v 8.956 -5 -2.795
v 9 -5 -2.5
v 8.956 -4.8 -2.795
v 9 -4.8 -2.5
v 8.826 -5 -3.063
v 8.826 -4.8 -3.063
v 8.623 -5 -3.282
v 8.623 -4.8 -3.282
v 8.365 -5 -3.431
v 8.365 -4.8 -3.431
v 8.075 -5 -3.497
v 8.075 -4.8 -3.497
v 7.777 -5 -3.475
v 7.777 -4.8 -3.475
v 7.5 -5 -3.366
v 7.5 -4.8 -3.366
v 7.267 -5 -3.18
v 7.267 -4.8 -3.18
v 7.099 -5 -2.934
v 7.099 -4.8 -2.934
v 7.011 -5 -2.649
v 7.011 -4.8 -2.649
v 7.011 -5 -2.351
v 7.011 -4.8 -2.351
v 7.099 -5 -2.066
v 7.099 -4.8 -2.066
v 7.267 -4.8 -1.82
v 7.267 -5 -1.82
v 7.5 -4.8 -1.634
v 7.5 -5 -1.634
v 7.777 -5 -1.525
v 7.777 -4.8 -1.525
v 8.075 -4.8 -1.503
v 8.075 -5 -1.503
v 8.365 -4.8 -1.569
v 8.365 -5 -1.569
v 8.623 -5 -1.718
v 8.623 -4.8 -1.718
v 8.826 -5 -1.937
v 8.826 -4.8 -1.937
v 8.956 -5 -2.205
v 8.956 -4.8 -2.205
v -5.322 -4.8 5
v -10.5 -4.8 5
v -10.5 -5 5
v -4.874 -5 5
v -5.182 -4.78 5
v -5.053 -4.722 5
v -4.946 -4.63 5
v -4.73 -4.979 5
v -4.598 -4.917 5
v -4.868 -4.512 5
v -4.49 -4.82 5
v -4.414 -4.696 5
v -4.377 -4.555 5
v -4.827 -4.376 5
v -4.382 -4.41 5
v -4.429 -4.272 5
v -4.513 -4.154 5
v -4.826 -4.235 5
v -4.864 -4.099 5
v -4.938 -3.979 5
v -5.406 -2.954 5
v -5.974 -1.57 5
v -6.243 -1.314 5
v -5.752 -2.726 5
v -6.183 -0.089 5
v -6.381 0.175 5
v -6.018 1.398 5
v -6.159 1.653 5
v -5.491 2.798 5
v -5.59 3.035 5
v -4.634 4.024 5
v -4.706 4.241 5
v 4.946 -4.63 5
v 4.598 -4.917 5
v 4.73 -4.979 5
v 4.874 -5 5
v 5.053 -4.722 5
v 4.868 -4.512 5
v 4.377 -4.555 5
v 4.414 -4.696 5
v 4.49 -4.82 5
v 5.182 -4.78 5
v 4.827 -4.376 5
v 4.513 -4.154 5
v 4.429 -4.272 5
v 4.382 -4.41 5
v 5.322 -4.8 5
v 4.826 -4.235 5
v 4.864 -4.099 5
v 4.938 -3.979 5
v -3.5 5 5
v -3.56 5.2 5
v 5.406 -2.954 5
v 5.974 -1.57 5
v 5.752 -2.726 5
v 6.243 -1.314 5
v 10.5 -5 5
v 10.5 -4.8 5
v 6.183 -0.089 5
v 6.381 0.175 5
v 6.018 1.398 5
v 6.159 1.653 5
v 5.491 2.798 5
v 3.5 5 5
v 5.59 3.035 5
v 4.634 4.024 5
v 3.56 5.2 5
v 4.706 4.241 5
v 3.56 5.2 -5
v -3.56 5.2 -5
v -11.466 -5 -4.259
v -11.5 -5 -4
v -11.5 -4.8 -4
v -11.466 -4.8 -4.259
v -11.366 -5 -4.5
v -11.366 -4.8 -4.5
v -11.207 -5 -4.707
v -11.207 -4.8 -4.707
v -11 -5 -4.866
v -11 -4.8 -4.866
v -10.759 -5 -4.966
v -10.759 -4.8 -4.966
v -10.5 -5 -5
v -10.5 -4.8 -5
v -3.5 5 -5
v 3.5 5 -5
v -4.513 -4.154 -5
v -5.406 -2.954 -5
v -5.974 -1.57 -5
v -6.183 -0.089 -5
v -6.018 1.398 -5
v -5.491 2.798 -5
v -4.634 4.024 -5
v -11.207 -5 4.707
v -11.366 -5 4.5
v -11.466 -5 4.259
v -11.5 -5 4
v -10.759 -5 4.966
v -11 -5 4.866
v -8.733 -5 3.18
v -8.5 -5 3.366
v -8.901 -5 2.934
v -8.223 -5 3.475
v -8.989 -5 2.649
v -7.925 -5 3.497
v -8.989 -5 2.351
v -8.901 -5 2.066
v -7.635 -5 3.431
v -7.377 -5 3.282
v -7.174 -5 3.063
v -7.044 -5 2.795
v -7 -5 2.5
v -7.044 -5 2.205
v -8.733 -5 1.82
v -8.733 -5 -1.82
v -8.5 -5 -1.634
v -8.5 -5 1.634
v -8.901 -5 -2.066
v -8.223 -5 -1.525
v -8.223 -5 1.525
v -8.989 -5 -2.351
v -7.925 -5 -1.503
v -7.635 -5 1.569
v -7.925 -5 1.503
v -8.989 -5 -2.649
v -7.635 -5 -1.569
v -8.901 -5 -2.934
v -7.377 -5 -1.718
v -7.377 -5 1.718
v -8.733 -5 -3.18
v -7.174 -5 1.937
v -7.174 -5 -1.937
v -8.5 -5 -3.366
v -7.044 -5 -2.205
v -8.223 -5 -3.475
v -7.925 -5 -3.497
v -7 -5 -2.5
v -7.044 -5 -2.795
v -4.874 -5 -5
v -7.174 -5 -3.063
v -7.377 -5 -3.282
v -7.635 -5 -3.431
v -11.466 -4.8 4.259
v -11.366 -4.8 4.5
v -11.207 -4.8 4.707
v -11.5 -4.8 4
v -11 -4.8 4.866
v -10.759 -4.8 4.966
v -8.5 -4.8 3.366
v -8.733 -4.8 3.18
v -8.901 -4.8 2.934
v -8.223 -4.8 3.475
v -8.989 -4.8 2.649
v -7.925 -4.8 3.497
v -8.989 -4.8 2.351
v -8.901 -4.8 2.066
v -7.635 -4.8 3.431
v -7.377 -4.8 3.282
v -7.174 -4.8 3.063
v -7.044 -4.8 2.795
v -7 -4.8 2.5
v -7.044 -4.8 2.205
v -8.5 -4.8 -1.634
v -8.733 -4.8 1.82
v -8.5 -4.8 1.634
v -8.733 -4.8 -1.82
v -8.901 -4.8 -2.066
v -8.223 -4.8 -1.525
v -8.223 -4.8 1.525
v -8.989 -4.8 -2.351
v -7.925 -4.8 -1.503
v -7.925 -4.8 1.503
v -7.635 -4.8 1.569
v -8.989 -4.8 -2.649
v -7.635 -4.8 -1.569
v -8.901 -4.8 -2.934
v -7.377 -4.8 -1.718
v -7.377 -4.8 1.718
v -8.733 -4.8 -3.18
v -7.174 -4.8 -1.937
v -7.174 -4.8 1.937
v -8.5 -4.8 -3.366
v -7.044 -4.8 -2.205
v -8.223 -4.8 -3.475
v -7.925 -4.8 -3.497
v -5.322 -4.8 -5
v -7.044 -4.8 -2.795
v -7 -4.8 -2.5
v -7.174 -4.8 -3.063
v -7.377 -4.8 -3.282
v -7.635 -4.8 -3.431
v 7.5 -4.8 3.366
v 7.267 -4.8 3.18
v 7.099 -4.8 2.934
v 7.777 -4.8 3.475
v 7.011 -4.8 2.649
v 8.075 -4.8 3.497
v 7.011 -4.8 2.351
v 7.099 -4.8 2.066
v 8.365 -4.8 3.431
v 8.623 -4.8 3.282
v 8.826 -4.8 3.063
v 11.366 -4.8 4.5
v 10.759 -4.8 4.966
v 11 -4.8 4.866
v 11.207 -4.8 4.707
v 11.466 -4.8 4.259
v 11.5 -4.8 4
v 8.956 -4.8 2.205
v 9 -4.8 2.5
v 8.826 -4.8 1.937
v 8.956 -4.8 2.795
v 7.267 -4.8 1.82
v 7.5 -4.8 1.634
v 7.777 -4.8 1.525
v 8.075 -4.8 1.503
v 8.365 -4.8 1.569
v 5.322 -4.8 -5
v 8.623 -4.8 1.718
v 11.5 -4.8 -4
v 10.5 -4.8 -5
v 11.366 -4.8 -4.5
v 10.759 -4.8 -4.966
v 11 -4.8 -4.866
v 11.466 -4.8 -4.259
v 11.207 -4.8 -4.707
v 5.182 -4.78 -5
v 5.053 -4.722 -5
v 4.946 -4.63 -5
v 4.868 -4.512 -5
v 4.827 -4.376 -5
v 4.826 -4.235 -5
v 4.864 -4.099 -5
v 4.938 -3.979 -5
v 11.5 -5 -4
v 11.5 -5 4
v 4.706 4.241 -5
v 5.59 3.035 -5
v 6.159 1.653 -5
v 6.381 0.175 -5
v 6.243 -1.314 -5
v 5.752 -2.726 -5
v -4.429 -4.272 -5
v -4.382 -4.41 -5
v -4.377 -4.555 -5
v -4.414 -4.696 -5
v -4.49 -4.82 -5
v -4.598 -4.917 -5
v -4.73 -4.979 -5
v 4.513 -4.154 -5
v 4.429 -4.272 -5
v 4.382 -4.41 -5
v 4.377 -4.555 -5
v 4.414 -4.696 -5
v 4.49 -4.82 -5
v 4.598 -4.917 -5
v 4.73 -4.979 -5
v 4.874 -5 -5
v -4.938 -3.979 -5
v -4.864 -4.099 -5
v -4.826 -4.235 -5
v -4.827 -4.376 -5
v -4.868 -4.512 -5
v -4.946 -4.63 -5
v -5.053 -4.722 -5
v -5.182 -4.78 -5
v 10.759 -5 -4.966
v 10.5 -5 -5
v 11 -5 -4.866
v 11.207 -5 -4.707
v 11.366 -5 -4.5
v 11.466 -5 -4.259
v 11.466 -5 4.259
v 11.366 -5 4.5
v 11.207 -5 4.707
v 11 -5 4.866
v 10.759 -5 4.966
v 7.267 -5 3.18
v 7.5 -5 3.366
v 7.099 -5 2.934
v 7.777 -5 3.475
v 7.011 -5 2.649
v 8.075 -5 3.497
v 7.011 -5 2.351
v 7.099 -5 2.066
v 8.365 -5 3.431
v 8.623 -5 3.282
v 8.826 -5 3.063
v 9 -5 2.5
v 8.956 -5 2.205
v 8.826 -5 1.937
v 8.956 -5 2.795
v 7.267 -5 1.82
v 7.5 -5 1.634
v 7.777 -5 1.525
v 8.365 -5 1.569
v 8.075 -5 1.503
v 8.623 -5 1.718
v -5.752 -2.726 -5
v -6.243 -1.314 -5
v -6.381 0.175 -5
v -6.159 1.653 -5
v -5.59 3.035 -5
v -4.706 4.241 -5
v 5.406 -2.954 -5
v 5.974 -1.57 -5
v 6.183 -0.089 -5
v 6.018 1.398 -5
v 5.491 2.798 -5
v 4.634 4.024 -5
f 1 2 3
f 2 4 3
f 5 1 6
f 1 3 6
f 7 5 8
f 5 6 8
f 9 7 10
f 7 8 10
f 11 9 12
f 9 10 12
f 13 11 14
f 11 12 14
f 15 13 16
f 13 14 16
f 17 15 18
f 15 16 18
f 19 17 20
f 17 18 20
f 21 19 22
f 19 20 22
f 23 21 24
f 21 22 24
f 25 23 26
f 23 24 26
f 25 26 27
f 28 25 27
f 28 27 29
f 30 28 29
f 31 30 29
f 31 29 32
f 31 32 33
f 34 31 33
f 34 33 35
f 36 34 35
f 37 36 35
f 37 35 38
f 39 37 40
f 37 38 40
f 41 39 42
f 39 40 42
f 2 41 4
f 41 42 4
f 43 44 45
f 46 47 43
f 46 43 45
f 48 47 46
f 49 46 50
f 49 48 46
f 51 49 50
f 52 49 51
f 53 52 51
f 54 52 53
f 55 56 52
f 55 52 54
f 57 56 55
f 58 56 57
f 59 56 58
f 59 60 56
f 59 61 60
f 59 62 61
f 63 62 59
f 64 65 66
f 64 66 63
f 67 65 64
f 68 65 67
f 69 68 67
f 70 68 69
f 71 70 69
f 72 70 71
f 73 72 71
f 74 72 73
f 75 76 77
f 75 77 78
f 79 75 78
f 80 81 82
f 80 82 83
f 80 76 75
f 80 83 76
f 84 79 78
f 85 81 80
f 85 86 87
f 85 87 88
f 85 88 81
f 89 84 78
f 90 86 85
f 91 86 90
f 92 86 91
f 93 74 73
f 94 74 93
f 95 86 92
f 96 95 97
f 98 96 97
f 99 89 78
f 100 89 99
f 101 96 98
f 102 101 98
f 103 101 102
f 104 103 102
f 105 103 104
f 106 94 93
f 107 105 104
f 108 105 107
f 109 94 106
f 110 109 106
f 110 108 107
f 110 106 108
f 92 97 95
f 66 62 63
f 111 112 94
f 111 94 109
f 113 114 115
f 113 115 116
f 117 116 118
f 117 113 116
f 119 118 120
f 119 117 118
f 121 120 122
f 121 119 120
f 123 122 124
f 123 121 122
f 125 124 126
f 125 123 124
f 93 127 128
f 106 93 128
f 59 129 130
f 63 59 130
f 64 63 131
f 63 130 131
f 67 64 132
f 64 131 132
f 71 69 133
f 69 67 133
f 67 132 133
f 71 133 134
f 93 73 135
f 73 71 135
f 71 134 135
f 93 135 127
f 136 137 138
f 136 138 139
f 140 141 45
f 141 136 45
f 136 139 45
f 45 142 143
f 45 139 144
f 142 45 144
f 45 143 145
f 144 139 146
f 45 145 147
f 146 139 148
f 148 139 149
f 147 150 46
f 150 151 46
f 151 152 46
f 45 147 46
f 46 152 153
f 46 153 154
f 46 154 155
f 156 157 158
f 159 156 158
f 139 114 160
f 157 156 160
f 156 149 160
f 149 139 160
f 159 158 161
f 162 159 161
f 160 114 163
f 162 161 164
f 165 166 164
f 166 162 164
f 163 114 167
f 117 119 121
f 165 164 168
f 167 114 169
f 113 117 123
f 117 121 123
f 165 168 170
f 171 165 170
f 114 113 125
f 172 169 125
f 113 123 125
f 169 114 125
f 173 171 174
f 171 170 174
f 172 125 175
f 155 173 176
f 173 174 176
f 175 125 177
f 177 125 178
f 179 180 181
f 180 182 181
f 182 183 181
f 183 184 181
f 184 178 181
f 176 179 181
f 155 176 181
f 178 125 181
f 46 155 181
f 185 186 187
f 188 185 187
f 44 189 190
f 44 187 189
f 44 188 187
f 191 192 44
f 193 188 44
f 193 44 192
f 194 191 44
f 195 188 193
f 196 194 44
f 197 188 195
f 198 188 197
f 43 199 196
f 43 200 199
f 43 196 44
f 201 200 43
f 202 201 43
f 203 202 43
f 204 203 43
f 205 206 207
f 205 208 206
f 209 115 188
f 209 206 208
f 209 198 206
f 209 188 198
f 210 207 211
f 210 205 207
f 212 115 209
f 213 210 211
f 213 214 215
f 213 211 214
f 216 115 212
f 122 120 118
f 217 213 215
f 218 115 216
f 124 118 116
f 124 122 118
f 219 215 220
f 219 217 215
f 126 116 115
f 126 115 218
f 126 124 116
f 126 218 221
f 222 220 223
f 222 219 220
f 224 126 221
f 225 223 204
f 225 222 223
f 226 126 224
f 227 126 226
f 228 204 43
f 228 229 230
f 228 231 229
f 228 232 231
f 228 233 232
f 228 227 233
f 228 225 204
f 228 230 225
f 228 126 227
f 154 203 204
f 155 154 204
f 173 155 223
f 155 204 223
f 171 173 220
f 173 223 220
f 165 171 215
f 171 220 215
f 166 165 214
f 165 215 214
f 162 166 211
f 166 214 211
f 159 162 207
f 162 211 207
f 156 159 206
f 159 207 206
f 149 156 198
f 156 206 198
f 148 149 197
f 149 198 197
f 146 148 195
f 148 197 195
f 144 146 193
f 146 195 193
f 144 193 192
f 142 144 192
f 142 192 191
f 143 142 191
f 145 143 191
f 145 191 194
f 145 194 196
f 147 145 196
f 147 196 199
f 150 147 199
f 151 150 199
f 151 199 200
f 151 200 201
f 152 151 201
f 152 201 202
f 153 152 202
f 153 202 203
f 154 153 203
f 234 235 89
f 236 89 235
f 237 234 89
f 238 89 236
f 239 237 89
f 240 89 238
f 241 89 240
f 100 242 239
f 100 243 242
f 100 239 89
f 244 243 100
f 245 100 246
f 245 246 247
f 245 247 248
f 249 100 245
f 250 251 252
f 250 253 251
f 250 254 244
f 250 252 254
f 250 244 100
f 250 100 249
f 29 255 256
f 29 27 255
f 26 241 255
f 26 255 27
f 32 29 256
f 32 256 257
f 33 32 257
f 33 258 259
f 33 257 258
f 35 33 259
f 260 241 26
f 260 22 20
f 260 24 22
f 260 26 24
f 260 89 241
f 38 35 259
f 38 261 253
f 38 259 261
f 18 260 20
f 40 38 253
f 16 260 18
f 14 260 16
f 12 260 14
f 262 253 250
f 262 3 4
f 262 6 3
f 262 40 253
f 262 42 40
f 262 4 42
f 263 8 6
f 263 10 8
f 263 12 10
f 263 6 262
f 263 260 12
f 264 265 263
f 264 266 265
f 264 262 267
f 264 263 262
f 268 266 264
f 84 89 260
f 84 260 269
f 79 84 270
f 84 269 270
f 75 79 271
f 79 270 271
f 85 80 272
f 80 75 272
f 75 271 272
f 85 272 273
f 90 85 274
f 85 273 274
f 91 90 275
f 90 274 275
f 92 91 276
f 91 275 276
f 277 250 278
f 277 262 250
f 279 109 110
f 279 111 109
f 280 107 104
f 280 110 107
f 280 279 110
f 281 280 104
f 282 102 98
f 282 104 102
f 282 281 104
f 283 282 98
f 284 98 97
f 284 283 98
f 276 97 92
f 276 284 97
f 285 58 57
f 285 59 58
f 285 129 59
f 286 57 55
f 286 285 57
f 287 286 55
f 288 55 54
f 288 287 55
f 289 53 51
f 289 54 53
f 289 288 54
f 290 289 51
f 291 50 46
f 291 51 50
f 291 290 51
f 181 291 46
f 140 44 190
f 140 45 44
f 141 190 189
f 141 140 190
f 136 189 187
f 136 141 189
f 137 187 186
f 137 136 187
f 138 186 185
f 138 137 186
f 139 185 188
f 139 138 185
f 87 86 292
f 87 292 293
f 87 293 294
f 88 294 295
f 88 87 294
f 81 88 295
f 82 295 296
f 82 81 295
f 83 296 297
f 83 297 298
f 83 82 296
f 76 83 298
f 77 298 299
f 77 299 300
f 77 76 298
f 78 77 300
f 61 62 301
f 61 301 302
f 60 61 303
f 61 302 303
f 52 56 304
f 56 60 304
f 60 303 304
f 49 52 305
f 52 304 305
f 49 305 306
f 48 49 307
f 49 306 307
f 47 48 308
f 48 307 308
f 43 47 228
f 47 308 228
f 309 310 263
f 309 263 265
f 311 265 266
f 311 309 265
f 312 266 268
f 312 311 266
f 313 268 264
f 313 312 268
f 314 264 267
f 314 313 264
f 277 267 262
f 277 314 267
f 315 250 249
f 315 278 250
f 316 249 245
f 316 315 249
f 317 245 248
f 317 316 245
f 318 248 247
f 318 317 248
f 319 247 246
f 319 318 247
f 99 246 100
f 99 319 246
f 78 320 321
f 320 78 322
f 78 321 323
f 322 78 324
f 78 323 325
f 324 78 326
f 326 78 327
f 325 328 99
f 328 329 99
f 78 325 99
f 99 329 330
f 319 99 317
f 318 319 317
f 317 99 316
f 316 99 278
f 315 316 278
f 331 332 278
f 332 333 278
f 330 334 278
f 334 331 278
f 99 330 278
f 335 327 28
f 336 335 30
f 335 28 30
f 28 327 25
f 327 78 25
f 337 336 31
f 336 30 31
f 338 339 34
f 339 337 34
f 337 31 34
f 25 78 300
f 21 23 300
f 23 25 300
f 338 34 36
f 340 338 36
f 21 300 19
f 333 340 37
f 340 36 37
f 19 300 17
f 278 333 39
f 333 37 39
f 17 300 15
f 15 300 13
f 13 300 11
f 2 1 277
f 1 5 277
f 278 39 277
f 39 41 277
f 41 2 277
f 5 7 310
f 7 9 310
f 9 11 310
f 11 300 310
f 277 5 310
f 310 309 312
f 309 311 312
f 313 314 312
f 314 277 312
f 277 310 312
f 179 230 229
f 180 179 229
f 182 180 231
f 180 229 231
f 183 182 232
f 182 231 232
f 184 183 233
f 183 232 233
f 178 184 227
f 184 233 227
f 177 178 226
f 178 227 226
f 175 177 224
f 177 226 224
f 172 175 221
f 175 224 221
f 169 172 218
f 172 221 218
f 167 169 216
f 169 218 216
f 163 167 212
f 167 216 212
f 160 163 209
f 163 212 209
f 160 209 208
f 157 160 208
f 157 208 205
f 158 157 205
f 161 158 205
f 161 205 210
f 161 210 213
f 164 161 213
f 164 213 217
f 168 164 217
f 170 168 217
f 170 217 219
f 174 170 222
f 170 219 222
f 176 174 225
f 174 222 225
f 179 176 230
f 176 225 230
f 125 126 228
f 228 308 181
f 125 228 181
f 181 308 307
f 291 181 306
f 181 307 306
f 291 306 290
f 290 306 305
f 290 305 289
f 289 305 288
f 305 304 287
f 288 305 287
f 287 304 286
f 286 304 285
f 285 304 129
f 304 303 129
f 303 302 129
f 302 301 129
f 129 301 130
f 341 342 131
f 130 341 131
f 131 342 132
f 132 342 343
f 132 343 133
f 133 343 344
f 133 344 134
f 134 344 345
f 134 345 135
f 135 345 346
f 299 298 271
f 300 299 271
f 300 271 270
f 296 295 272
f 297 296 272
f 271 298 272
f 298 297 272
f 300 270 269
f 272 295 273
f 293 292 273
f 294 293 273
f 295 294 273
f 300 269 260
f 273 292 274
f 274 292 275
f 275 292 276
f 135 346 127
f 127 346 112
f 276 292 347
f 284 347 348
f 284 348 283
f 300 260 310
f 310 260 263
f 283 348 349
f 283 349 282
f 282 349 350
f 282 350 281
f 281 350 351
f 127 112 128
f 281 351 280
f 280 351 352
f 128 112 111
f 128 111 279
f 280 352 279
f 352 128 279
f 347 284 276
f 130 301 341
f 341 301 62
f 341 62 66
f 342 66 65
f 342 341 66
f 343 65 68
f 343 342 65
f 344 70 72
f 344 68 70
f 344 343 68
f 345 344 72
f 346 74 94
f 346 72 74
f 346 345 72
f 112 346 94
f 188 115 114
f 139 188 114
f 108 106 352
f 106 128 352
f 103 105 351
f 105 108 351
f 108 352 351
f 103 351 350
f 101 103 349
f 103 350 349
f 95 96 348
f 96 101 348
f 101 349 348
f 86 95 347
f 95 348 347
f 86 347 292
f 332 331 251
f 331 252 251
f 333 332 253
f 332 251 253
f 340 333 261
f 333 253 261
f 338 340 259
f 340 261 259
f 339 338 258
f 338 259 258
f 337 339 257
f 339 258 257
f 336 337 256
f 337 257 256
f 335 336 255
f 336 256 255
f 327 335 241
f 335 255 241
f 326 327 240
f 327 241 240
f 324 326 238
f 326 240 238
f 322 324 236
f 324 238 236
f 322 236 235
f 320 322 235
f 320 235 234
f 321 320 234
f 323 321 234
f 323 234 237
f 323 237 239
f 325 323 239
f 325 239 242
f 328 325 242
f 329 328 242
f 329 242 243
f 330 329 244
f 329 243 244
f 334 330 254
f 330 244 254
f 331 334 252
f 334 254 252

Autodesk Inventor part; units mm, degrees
sketch "Sketch1" plane through (0, 0, 0) normal (0, 0, 1) x (1, 0, 0)
  line L0 (-6, 5) -> (6, 5) construction
  line L1 (6, 5) -> (6, -5) construction
  line L2 (6, -5) -> (-6, -5) construction
  line L3 (-6, -5) -> (-6, 5) construction
  line L4 (-6, 5) -> (6, -5) construction
  line L5 (6, 5) -> (-6, -5) construction
  line L6 (-3.5, 5) -> (3.5, 5)
  line L7 (-3.5, -5) -> (3.5, -5) construction
  arc A0 (-3.5, 5) -> (-3.5, -5) centre (-0.1834, 0) ccw
  arc A1 (3.5, -5) -> (3.5, 5) centre (0.1834, 0) ccw
  line L8 (-11.5, -5) -> (-3.5, -5)
  line L9 (3.5, -5) -> (11.5, -5)
  line L10 (-11.5, -4.8) -> (-4.1077, -4.8)
  arc A2 (-3.5598, 5.2) -> (-4.1077, -4.8) centre (-0.1834, 0) ccw
  line L11 (-3.5598, 5.2) -> (3.5598, 5.2)
  arc A3 (4.1077, -4.8) -> (3.5598, 5.2) centre (0.1834, 0) ccw
  line L12 (4.1077, -4.8) -> (11.5, -4.8)
  line L13 (11.5, -4.8) -> (11.5, -5)
  line L14 (-11.5, -4.8) -> (-11.5, -5)
  point P0 (0, 0)
  point P1 (0, 0)
  point P2 (0, 5)
  point P3 (0, 5)
  point P4 (0, -5)
  point P5 (0, -5)
  dimension "d0" = 10
  dimension "d1" = 12
  dimension "d2" = 7
  dimension "d3" = 6
  dimension "d4" = 6
  dimension "d5" = 8
  dimension "d6" = 0.2
  dimension "d11" = 7
extrude "Extrusion1" add sketch "Sketch1" along normal mid plane 10
fillet "Fillet1" radius 1 4 edges at (-11.5, -4.9, -5) (-11.5, -4.9, 5) (11.5, -4.9, 5) (11.5, -4.9, -5)
sketch "Sketch2" plane through (4.1077, -4.8, 5) normal (0, 1, 0) x (1, 0, 0)
  point P0 (-4.1077, 5)
fillet "Fillet3" radius 0.5 4 edges at (4.1077, -4.8, 0) (3.5, -5, 0) (-3.5, -5, 0) (-4.1077, -4.8, 0)
sketch "Sketch3" plane through (11.5, -4.8, 4) normal (0, 1, 0) x (1, 0, 0)
  circle A0 centre (-3.5, 1.5) radius 1 projected
  circle A1 centre (-3.5, 6.5) radius 1 projected
  circle A2 centre (-19.5, 6.5) radius 1 projected
  circle A3 centre (-19.5, 1.5) radius 1 projected
  point P0 (-11.5, 4)
extrude "Extrusion2" cut sketch "Sketch3" against normal through all
properties part number "chapa_motor_001" material "Steel"
